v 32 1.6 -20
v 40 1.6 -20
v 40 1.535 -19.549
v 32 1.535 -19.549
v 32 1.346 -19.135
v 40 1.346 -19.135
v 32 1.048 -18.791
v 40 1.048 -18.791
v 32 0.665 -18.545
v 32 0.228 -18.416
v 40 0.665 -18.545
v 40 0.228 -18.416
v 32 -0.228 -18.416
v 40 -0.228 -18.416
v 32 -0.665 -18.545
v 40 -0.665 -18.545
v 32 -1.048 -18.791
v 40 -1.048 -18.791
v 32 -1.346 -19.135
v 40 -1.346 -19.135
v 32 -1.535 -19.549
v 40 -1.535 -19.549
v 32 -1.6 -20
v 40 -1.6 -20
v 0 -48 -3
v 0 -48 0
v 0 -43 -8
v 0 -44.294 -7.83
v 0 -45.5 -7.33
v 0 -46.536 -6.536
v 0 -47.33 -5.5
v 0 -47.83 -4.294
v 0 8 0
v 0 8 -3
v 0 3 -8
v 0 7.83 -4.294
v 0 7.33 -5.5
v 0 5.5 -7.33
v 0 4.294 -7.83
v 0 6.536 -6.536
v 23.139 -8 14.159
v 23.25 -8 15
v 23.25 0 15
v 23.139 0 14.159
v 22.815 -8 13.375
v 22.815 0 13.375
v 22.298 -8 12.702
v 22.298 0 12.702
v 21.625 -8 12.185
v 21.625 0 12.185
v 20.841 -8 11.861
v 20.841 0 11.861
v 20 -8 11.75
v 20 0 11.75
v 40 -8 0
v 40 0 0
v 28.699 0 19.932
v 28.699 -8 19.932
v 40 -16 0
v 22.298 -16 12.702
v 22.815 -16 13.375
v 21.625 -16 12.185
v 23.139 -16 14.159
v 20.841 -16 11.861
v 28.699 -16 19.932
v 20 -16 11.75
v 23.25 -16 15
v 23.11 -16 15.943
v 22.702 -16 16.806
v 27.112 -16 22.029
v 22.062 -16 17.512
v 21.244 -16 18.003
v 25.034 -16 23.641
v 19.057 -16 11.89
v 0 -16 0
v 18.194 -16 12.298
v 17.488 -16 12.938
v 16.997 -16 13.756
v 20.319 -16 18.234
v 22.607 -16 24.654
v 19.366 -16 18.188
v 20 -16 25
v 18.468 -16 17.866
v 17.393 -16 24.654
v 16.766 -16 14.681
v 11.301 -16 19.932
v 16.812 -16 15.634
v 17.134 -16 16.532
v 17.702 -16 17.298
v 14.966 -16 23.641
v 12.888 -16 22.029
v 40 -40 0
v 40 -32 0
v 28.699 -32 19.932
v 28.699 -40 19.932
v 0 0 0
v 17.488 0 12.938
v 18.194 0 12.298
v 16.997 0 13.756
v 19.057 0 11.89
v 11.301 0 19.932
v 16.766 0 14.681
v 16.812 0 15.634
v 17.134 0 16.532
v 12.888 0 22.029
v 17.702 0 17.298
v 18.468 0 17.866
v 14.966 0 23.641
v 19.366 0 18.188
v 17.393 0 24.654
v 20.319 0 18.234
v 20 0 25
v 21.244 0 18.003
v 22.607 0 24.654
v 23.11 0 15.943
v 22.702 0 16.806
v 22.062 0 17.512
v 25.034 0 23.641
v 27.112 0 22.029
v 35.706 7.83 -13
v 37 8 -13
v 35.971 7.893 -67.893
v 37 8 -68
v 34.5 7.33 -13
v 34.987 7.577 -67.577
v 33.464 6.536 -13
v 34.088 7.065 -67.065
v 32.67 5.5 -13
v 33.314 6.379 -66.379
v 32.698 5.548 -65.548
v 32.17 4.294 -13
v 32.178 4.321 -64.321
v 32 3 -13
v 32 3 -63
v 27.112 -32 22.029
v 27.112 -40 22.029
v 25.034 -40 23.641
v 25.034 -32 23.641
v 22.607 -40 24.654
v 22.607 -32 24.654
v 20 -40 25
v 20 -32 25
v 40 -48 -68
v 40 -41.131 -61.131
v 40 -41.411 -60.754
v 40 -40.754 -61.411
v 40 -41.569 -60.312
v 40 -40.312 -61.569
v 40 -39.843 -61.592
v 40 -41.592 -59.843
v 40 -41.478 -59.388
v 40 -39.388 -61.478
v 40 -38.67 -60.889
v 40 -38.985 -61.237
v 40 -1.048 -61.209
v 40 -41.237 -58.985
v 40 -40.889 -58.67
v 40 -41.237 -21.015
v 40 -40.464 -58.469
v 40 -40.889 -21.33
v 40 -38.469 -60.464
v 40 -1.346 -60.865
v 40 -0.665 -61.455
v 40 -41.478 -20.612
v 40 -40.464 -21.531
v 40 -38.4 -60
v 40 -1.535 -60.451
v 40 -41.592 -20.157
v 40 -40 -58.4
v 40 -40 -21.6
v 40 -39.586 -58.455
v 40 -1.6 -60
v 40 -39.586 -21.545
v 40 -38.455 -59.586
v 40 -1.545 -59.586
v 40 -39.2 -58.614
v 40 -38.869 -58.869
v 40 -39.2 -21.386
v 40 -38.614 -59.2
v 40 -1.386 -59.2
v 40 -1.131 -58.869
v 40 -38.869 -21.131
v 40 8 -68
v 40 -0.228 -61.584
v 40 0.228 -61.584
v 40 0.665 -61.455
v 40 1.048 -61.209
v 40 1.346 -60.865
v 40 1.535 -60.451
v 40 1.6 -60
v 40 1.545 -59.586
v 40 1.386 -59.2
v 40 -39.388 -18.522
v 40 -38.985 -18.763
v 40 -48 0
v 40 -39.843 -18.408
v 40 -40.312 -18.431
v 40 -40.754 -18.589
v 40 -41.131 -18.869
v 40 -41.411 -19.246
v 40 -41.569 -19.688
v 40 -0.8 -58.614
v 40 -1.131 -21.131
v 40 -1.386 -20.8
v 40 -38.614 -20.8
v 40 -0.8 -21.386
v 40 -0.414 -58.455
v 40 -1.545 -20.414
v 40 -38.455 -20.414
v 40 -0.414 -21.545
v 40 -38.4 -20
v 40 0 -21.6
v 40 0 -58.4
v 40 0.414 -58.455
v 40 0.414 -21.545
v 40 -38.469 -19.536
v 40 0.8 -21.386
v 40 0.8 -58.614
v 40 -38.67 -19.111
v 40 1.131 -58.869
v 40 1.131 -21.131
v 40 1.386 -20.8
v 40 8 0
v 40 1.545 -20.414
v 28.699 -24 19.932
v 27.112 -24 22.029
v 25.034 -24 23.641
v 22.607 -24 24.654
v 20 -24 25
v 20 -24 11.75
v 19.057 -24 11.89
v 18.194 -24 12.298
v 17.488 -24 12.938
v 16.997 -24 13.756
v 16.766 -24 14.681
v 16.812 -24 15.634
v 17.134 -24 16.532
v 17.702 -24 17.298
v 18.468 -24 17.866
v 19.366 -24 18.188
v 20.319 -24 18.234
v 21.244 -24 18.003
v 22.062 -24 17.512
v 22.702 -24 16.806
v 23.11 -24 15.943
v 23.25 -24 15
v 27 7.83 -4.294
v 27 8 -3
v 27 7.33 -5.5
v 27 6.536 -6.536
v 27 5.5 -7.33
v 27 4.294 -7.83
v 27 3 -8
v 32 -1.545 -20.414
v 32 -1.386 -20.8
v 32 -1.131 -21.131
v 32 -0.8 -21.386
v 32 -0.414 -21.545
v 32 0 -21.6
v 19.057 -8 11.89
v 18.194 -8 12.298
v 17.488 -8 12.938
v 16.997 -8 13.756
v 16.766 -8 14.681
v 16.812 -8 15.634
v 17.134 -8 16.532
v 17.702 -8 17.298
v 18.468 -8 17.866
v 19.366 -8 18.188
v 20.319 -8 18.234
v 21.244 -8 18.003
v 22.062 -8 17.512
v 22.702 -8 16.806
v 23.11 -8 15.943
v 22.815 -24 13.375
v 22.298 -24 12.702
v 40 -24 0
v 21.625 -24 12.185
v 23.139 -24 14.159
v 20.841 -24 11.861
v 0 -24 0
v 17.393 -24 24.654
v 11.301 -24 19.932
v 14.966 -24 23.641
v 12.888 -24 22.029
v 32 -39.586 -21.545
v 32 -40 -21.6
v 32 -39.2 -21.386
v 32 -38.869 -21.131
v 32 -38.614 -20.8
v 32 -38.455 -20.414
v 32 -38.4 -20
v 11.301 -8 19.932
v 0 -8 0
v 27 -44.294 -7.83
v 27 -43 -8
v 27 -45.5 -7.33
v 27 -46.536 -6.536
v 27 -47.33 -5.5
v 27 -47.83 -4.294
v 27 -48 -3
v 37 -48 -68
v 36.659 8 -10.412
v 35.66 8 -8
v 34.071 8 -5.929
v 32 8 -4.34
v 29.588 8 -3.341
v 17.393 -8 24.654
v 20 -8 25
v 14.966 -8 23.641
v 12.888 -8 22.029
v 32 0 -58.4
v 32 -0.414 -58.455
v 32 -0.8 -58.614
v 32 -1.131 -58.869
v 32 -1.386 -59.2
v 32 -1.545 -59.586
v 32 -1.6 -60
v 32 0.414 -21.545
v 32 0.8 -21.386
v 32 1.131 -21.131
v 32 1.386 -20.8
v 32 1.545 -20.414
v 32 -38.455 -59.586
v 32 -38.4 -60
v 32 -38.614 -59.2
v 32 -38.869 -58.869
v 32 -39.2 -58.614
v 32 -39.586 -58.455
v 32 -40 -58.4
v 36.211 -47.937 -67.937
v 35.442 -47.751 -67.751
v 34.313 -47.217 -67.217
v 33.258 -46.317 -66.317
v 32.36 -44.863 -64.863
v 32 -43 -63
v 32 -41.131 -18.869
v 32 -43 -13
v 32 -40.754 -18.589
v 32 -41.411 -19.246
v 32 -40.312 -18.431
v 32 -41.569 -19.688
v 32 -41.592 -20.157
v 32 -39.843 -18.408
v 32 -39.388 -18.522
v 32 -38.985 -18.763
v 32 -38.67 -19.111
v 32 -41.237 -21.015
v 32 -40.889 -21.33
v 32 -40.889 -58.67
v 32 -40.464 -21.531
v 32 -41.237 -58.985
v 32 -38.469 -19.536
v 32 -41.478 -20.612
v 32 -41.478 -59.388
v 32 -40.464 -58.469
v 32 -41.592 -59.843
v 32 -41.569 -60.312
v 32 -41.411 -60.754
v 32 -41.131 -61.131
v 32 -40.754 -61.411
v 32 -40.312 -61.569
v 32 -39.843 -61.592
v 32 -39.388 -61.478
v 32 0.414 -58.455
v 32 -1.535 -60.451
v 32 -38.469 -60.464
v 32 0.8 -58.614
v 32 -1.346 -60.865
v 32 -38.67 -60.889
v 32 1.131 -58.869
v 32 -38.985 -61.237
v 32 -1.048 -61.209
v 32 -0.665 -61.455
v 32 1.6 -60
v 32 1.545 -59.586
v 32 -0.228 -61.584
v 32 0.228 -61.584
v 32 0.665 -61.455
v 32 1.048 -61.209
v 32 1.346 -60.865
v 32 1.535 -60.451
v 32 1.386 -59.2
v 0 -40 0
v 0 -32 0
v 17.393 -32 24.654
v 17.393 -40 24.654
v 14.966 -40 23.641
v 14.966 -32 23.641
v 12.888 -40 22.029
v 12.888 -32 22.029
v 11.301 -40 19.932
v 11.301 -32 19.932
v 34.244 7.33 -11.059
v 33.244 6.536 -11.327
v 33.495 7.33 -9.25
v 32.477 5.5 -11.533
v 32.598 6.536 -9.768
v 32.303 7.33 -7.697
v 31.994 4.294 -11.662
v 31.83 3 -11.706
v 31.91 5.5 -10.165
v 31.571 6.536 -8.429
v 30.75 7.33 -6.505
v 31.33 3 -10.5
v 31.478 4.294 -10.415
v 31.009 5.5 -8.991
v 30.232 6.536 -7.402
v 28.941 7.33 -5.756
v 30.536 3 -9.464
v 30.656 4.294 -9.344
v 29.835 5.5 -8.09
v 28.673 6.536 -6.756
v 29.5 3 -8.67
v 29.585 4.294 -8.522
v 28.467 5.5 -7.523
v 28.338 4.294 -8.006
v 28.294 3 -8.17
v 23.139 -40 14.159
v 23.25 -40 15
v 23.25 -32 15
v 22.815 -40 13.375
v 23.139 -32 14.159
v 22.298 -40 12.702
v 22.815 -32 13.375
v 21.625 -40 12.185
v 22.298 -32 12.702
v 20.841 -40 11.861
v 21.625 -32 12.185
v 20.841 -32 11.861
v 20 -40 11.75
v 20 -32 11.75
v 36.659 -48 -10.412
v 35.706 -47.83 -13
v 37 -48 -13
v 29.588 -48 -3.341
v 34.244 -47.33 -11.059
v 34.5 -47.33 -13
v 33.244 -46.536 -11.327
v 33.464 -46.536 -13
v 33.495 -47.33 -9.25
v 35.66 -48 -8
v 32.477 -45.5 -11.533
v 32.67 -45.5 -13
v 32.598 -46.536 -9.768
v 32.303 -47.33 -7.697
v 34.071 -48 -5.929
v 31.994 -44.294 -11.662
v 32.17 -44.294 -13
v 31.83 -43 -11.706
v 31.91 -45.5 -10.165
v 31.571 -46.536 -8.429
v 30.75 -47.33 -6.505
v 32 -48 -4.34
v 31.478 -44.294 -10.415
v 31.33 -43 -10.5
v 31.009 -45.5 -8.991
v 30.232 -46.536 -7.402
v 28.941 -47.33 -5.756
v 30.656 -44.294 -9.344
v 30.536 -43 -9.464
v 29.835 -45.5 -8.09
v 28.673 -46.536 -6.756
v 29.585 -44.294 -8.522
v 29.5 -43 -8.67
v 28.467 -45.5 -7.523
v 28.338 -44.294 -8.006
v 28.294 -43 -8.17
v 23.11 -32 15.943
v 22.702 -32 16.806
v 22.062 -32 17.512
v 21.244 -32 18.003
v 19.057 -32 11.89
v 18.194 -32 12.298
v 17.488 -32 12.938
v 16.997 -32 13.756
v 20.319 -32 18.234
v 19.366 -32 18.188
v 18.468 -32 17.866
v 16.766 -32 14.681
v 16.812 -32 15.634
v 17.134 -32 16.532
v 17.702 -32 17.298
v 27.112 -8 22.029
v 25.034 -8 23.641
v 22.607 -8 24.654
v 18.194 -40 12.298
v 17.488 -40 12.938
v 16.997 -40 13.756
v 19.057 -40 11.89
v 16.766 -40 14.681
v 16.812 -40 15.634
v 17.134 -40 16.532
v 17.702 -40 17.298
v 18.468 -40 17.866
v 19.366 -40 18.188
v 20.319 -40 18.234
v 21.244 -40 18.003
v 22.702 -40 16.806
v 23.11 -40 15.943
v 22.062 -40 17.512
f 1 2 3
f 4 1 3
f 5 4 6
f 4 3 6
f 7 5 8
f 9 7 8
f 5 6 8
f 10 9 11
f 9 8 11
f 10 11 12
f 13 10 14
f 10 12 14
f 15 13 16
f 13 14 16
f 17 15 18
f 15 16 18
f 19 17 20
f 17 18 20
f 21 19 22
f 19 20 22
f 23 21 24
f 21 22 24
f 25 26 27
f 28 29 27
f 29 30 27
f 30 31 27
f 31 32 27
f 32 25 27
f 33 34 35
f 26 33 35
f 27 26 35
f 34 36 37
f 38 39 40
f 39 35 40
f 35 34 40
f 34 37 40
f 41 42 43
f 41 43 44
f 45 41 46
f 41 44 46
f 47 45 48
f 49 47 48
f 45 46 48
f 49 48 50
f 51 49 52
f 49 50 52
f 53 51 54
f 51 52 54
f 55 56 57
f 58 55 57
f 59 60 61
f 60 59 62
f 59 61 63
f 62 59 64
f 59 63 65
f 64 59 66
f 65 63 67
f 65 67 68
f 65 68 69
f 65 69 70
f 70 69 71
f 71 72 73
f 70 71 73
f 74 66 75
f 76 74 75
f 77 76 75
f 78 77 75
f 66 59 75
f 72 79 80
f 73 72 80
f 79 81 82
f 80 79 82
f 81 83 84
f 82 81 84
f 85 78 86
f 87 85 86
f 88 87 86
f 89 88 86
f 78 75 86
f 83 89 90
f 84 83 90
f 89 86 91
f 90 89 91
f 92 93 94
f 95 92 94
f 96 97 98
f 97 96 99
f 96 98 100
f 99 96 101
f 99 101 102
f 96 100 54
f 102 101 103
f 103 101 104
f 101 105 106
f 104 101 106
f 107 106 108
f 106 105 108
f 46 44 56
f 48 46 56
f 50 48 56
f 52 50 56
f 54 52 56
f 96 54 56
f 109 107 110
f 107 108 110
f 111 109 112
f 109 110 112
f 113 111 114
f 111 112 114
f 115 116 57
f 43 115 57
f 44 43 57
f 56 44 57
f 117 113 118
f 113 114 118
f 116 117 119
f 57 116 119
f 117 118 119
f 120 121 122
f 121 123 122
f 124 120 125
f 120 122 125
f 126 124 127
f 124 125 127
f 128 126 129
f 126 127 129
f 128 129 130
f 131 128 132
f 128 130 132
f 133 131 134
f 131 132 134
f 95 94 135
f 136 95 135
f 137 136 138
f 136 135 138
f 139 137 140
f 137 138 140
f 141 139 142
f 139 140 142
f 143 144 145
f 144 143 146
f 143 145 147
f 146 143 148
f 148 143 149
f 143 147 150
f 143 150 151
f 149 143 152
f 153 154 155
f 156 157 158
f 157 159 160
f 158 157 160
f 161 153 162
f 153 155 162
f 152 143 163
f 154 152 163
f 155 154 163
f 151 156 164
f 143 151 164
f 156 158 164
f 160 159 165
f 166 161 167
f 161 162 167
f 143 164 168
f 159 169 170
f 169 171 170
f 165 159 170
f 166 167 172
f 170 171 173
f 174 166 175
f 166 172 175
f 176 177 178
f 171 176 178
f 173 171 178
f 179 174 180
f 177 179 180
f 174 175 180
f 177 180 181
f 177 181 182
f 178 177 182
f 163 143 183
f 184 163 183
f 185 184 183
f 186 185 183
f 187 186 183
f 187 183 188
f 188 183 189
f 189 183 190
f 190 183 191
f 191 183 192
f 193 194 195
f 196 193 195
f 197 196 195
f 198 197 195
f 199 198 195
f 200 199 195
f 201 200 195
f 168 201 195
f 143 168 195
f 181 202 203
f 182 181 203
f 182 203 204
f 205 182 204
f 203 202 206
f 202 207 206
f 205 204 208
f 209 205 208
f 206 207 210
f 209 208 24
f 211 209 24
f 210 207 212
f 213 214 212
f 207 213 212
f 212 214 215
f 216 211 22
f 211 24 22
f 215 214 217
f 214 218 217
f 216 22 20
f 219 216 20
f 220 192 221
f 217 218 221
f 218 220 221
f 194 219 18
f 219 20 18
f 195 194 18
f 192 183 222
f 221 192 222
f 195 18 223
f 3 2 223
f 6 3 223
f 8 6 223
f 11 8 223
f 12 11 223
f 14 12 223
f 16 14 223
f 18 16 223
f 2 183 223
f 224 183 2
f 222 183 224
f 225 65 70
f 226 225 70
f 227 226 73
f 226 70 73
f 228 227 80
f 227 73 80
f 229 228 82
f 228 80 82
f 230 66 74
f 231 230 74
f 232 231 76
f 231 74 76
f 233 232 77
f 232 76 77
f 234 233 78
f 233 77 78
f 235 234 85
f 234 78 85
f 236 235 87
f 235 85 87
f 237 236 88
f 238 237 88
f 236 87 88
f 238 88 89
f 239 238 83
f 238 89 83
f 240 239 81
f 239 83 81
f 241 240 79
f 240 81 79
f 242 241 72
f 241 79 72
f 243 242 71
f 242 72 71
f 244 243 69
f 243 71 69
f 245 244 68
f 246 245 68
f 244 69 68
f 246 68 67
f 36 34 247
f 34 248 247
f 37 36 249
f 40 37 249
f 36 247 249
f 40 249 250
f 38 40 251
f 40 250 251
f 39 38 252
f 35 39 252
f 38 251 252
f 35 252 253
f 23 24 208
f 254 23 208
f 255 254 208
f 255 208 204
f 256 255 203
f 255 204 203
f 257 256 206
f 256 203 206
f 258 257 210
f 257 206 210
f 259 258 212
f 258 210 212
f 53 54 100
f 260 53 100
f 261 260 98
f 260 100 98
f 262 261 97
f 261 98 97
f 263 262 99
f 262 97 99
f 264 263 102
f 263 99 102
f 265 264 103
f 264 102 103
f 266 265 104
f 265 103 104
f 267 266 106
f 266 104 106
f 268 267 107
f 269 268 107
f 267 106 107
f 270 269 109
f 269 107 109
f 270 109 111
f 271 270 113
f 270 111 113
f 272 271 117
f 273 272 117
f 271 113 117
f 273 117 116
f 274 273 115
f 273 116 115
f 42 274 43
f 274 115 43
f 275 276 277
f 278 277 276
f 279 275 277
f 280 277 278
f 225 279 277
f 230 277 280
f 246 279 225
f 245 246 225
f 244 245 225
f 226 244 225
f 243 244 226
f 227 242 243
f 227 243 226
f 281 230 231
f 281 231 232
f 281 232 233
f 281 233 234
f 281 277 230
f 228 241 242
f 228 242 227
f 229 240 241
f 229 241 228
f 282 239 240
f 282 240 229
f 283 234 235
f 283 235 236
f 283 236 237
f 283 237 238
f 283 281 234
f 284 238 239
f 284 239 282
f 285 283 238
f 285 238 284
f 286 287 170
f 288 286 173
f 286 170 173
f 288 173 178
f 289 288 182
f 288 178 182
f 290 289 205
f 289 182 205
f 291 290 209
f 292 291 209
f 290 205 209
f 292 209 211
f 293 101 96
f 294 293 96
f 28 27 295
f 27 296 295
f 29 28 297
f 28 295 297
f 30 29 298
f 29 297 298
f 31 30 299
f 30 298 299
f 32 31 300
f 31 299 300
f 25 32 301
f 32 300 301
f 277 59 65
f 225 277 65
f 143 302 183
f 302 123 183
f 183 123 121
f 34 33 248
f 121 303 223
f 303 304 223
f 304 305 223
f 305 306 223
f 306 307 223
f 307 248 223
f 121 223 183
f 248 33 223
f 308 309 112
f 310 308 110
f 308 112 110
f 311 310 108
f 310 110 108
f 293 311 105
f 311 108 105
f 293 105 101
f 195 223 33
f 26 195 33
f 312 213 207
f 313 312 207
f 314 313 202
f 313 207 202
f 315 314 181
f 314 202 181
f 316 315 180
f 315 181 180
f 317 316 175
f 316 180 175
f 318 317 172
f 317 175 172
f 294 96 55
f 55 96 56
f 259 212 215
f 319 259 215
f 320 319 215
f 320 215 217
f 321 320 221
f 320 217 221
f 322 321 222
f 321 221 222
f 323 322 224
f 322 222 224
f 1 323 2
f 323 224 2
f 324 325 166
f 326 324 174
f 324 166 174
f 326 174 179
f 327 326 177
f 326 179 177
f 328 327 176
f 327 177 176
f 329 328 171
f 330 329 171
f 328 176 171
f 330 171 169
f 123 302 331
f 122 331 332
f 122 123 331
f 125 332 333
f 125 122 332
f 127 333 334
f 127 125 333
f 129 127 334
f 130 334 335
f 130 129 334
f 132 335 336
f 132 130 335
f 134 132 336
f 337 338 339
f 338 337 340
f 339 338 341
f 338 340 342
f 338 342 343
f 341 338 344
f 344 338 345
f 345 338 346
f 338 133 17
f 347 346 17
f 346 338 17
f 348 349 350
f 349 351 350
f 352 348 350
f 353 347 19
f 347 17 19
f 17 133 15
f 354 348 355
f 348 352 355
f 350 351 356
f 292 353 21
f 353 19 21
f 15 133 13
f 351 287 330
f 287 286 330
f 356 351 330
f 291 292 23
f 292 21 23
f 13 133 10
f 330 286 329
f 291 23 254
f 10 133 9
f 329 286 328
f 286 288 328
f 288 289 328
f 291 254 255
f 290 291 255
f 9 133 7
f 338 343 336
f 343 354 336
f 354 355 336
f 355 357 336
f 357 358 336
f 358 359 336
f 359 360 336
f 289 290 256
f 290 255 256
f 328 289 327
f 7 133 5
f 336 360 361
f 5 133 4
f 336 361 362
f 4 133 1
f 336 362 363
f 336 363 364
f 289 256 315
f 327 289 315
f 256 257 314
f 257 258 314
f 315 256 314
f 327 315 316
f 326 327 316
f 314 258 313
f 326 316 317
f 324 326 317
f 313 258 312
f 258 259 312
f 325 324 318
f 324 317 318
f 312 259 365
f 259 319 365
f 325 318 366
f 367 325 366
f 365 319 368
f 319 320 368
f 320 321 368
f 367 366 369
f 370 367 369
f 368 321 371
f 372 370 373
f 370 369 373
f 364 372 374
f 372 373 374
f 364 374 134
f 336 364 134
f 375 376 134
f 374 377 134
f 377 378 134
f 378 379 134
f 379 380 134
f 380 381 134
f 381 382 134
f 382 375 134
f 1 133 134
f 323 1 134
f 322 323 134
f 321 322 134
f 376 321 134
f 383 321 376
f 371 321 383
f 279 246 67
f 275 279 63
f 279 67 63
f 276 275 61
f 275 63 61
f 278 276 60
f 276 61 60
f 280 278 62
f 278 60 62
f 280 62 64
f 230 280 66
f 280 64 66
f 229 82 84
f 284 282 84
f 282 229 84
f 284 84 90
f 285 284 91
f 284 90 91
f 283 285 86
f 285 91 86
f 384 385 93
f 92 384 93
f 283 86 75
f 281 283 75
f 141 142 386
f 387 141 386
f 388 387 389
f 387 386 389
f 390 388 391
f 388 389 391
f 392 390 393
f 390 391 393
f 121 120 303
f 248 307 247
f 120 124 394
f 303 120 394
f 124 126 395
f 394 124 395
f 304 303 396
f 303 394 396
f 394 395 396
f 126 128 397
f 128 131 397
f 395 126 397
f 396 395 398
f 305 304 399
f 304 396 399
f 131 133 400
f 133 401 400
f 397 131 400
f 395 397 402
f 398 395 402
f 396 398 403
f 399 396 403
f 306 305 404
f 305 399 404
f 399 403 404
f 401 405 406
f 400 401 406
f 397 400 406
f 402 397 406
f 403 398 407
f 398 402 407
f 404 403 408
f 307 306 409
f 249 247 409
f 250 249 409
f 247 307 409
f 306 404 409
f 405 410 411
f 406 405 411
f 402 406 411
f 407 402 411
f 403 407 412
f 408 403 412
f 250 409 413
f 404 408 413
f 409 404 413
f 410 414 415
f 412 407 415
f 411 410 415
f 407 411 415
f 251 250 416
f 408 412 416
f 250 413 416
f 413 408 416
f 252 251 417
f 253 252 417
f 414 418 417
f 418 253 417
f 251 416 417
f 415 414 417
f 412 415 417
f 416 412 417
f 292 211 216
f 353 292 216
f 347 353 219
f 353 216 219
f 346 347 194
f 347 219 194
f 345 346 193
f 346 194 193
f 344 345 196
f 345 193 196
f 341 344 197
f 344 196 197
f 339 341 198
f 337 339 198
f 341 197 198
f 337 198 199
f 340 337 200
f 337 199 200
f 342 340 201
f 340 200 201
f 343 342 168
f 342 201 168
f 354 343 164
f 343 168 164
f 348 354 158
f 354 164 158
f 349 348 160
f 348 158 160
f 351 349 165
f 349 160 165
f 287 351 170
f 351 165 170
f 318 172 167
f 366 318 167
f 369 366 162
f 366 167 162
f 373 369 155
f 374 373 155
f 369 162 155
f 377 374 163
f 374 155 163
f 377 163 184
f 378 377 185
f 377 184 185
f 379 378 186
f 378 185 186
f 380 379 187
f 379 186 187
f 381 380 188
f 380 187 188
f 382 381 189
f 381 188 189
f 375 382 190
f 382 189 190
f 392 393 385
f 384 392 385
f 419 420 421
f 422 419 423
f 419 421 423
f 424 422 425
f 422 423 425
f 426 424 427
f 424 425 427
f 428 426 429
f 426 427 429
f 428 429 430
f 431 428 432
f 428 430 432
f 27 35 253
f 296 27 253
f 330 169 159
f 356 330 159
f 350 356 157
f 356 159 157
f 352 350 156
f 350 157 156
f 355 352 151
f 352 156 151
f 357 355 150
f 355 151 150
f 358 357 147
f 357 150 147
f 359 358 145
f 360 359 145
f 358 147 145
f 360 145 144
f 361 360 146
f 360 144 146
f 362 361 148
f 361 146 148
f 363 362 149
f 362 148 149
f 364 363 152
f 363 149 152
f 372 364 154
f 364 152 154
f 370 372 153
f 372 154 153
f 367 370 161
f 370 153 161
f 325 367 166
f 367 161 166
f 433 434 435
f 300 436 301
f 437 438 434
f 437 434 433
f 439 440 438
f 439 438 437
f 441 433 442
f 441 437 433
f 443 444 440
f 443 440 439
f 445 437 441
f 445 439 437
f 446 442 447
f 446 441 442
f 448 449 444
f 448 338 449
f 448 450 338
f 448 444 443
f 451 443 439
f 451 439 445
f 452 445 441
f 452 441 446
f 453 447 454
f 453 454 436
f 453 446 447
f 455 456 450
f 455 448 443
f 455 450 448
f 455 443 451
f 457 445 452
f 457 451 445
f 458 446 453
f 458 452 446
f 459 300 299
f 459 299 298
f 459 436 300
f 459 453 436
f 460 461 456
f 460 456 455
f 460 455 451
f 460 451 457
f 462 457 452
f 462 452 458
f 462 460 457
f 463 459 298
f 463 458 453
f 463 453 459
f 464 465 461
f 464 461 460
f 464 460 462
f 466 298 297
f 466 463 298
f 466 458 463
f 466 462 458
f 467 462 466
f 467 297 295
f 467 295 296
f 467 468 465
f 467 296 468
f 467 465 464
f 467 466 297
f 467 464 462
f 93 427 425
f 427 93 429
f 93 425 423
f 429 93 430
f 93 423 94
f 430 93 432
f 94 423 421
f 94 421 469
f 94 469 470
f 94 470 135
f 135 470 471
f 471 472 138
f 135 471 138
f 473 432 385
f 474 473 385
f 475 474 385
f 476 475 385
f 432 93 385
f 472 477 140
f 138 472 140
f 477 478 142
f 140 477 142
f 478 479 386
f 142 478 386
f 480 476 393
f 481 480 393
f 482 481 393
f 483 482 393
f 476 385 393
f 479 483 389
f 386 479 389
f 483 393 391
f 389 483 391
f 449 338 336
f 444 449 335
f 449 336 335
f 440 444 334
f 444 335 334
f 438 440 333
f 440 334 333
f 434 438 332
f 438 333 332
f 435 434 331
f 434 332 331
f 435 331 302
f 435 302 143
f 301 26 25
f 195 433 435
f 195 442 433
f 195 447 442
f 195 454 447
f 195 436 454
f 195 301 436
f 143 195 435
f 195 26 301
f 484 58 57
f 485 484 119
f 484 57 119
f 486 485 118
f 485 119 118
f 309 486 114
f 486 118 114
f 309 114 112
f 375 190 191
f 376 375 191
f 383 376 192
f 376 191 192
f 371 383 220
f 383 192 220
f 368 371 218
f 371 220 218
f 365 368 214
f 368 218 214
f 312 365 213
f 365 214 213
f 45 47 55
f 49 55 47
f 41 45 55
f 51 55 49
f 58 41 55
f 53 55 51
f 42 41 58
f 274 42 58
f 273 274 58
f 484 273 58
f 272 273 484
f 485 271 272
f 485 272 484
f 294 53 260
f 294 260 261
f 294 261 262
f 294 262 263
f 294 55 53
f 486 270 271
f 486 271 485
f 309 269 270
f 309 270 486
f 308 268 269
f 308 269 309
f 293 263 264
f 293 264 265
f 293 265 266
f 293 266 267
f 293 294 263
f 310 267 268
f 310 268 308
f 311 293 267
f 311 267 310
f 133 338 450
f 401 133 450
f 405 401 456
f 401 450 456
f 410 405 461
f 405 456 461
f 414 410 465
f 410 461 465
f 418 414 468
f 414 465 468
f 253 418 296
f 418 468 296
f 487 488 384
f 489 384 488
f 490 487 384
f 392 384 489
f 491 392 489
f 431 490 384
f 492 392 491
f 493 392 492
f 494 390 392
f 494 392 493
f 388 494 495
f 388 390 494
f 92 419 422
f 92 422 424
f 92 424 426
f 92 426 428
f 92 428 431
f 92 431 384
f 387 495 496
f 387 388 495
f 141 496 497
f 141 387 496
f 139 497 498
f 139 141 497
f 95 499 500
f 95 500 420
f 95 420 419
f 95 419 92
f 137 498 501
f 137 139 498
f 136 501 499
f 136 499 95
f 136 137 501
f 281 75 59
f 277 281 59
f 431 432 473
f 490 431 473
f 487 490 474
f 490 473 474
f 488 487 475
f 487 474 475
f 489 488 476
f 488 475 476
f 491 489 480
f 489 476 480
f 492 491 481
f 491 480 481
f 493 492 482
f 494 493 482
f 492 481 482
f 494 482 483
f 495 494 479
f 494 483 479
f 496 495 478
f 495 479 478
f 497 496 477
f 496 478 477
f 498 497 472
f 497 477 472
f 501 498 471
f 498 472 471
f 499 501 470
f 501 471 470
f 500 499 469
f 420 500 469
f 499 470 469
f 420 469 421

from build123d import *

# Parameters (mm, degrees)
F1_DEPTH      = 40
F2_W          = 8
F2_H          = 25
F3_DEPTH      = 40
F5_DEPTH      = 48
F5_DEPTH_BACK = 8
F6_R          = 5
F8_DEPTH      = 25


with BuildPart() as f1:
    # F0 (on Front) → F1 (new body)
    with BuildSketch(Plane.XZ):
        with BuildLine():
            ThreePointArc((20, 25), (14.9661749692, 23.6406368723), (11.3009091661, 19.9321211119))
            ThreePointArc((11.3009091661, 19.9321211119), (11.3593631277, 9.9661749692), (20, 5))
            ThreePointArc((20, 5), (27.0710678119, 7.9289321881), (30, 15))
            ThreePointArc((30, 15), (29.6693047408, 17.5504011116), (28.6990908339, 19.9321211119))
            ThreePointArc((28.6990908339, 19.9321211119), (25.0338250308, 23.6406368723), (20, 25))
        make_face()
        with BuildLine():
            ThreePointArc((23.25, 15), (22.2980970389, 12.7019029611), (20, 11.75))
            ThreePointArc((20, 11.75), (17.7019029611, 17.2980970389), (23.25, 15))
        make_face(mode=Mode.SUBTRACT)
        with BuildLine():
            Line((11.3009091661, 19.9321211119), (0, 0))
            Line((0, 0), (20, 0))
            Line((20, 0), (20, 5))
            ThreePointArc((20, 5), (11.3593631277, 9.9661749692), (11.3009091661, 19.9321211119))
        make_face()
        with BuildLine():
            Line((20, 5), (20, 0))
            Line((20, 0), (40, 0))
            Line((40, 0), (28.6990908339, 19.9321211119))
            ThreePointArc((28.6990908339, 19.9321211119), (29.6693047408, 17.5504011116), (30, 15))
            ThreePointArc((30, 15), (27.0710678119, 7.9289321881), (20, 5))
        make_face()
    extrude(amount=F1_DEPTH)

    # F2 (on Right) → F3 (cut)
    with BuildSketch(Plane.YZ):
        with Locations((-28, 12.5)):
            Rectangle(F2_W, F2_H)
        with Locations((-12, 12.5)):
            Rectangle(F2_W, F2_H)
    extrude(amount=F3_DEPTH, mode=Mode.SUBTRACT)


with BuildPart() as f5:
    # F4 (on face) → F5 (new body, two sides)
    with BuildSketch(Plane.XZ.offset(40)) as f5_sk:
        Polygon((40, 0), (0, 0), (0, -8), (32, -8), (32, -68), (40, -68), align=None)
    extrude(amount=-F5_DEPTH)
    extrude(f5_sk.sketch, amount=F5_DEPTH_BACK)

    # F6
    f6_edges = [f5.edges().sort_by_distance(p)[0] for p in [
        (32, -48, -38),
        (16, -48, -8),
        (32, -20, -68),
        (32, -20, -8),
        (32, 8, -38),
        (16, 8, -8),
    ]]
    fillet(f6_edges, radius=F6_R)

    # F7 (on face) → F8 (cut)
    with BuildSketch(Plane.YZ.offset(40)):
        with BuildLine():
            ThreePointArc((-1.6, -20), (-1.1313708499, -21.1313708499), (0, -21.6))
            Line((0, -21.6), (0, -20))
            Line((0, -20), (-1.6, -20))
        make_face()
        with BuildLine():
            Line((0, -20), (0, -21.6))
            ThreePointArc((0, -21.6), (1.1313708499, -21.1313708499), (1.6, -20))
            ThreePointArc((1.6, -20), (0, -18.4), (-1.6, -20))
            Line((-1.6, -20), (0, -20))
        make_face()
        with BuildLine():
            ThreePointArc((-38.4, -20), (-41.1313708499, -18.8686291501), (-40, -21.6))
            Line((-40, -21.6), (-40, -20))
            Line((-40, -20), (-38.4, -20))
        make_face()
        with BuildLine():
            Line((-40, -20), (-40, -21.6))
            ThreePointArc((-40, -21.6), (-38.8686291501, -21.1313708499), (-38.4, -20))
            Line((-38.4, -20), (-40, -20))
        make_face()
        with BuildLine():
            ThreePointArc((0, -58.4), (-1.1313708499, -58.8686291501), (-1.6, -60))
            Line((-1.6, -60), (0, -60))
            Line((0, -60), (0, -58.4))
        make_face()
        with BuildLine():
            Line((0, -60), (-1.6, -60))
            ThreePointArc((-1.6, -60), (0, -61.6), (1.6, -60))
            ThreePointArc((1.6, -60), (1.1313708499, -58.8686291501), (0, -58.4))
            Line((0, -58.4), (0, -60))
        make_face()
        with BuildLine():
            Line((-40, -60), (-38.4, -60))
            ThreePointArc((-38.4, -60), (-38.8686291501, -58.8686291501), (-40, -58.4))
            Line((-40, -58.4), (-40, -60))
        make_face()
        with BuildLine():
            ThreePointArc((-40, -58.4), (-41.1313708499, -61.1313708499), (-38.4, -60))
            Line((-38.4, -60), (-40, -60))
            Line((-40, -60), (-40, -58.4))
        make_face()
    extrude(amount=-F8_DEPTH, mode=Mode.SUBTRACT)


solid = Compound([f1.part, f5.part])
